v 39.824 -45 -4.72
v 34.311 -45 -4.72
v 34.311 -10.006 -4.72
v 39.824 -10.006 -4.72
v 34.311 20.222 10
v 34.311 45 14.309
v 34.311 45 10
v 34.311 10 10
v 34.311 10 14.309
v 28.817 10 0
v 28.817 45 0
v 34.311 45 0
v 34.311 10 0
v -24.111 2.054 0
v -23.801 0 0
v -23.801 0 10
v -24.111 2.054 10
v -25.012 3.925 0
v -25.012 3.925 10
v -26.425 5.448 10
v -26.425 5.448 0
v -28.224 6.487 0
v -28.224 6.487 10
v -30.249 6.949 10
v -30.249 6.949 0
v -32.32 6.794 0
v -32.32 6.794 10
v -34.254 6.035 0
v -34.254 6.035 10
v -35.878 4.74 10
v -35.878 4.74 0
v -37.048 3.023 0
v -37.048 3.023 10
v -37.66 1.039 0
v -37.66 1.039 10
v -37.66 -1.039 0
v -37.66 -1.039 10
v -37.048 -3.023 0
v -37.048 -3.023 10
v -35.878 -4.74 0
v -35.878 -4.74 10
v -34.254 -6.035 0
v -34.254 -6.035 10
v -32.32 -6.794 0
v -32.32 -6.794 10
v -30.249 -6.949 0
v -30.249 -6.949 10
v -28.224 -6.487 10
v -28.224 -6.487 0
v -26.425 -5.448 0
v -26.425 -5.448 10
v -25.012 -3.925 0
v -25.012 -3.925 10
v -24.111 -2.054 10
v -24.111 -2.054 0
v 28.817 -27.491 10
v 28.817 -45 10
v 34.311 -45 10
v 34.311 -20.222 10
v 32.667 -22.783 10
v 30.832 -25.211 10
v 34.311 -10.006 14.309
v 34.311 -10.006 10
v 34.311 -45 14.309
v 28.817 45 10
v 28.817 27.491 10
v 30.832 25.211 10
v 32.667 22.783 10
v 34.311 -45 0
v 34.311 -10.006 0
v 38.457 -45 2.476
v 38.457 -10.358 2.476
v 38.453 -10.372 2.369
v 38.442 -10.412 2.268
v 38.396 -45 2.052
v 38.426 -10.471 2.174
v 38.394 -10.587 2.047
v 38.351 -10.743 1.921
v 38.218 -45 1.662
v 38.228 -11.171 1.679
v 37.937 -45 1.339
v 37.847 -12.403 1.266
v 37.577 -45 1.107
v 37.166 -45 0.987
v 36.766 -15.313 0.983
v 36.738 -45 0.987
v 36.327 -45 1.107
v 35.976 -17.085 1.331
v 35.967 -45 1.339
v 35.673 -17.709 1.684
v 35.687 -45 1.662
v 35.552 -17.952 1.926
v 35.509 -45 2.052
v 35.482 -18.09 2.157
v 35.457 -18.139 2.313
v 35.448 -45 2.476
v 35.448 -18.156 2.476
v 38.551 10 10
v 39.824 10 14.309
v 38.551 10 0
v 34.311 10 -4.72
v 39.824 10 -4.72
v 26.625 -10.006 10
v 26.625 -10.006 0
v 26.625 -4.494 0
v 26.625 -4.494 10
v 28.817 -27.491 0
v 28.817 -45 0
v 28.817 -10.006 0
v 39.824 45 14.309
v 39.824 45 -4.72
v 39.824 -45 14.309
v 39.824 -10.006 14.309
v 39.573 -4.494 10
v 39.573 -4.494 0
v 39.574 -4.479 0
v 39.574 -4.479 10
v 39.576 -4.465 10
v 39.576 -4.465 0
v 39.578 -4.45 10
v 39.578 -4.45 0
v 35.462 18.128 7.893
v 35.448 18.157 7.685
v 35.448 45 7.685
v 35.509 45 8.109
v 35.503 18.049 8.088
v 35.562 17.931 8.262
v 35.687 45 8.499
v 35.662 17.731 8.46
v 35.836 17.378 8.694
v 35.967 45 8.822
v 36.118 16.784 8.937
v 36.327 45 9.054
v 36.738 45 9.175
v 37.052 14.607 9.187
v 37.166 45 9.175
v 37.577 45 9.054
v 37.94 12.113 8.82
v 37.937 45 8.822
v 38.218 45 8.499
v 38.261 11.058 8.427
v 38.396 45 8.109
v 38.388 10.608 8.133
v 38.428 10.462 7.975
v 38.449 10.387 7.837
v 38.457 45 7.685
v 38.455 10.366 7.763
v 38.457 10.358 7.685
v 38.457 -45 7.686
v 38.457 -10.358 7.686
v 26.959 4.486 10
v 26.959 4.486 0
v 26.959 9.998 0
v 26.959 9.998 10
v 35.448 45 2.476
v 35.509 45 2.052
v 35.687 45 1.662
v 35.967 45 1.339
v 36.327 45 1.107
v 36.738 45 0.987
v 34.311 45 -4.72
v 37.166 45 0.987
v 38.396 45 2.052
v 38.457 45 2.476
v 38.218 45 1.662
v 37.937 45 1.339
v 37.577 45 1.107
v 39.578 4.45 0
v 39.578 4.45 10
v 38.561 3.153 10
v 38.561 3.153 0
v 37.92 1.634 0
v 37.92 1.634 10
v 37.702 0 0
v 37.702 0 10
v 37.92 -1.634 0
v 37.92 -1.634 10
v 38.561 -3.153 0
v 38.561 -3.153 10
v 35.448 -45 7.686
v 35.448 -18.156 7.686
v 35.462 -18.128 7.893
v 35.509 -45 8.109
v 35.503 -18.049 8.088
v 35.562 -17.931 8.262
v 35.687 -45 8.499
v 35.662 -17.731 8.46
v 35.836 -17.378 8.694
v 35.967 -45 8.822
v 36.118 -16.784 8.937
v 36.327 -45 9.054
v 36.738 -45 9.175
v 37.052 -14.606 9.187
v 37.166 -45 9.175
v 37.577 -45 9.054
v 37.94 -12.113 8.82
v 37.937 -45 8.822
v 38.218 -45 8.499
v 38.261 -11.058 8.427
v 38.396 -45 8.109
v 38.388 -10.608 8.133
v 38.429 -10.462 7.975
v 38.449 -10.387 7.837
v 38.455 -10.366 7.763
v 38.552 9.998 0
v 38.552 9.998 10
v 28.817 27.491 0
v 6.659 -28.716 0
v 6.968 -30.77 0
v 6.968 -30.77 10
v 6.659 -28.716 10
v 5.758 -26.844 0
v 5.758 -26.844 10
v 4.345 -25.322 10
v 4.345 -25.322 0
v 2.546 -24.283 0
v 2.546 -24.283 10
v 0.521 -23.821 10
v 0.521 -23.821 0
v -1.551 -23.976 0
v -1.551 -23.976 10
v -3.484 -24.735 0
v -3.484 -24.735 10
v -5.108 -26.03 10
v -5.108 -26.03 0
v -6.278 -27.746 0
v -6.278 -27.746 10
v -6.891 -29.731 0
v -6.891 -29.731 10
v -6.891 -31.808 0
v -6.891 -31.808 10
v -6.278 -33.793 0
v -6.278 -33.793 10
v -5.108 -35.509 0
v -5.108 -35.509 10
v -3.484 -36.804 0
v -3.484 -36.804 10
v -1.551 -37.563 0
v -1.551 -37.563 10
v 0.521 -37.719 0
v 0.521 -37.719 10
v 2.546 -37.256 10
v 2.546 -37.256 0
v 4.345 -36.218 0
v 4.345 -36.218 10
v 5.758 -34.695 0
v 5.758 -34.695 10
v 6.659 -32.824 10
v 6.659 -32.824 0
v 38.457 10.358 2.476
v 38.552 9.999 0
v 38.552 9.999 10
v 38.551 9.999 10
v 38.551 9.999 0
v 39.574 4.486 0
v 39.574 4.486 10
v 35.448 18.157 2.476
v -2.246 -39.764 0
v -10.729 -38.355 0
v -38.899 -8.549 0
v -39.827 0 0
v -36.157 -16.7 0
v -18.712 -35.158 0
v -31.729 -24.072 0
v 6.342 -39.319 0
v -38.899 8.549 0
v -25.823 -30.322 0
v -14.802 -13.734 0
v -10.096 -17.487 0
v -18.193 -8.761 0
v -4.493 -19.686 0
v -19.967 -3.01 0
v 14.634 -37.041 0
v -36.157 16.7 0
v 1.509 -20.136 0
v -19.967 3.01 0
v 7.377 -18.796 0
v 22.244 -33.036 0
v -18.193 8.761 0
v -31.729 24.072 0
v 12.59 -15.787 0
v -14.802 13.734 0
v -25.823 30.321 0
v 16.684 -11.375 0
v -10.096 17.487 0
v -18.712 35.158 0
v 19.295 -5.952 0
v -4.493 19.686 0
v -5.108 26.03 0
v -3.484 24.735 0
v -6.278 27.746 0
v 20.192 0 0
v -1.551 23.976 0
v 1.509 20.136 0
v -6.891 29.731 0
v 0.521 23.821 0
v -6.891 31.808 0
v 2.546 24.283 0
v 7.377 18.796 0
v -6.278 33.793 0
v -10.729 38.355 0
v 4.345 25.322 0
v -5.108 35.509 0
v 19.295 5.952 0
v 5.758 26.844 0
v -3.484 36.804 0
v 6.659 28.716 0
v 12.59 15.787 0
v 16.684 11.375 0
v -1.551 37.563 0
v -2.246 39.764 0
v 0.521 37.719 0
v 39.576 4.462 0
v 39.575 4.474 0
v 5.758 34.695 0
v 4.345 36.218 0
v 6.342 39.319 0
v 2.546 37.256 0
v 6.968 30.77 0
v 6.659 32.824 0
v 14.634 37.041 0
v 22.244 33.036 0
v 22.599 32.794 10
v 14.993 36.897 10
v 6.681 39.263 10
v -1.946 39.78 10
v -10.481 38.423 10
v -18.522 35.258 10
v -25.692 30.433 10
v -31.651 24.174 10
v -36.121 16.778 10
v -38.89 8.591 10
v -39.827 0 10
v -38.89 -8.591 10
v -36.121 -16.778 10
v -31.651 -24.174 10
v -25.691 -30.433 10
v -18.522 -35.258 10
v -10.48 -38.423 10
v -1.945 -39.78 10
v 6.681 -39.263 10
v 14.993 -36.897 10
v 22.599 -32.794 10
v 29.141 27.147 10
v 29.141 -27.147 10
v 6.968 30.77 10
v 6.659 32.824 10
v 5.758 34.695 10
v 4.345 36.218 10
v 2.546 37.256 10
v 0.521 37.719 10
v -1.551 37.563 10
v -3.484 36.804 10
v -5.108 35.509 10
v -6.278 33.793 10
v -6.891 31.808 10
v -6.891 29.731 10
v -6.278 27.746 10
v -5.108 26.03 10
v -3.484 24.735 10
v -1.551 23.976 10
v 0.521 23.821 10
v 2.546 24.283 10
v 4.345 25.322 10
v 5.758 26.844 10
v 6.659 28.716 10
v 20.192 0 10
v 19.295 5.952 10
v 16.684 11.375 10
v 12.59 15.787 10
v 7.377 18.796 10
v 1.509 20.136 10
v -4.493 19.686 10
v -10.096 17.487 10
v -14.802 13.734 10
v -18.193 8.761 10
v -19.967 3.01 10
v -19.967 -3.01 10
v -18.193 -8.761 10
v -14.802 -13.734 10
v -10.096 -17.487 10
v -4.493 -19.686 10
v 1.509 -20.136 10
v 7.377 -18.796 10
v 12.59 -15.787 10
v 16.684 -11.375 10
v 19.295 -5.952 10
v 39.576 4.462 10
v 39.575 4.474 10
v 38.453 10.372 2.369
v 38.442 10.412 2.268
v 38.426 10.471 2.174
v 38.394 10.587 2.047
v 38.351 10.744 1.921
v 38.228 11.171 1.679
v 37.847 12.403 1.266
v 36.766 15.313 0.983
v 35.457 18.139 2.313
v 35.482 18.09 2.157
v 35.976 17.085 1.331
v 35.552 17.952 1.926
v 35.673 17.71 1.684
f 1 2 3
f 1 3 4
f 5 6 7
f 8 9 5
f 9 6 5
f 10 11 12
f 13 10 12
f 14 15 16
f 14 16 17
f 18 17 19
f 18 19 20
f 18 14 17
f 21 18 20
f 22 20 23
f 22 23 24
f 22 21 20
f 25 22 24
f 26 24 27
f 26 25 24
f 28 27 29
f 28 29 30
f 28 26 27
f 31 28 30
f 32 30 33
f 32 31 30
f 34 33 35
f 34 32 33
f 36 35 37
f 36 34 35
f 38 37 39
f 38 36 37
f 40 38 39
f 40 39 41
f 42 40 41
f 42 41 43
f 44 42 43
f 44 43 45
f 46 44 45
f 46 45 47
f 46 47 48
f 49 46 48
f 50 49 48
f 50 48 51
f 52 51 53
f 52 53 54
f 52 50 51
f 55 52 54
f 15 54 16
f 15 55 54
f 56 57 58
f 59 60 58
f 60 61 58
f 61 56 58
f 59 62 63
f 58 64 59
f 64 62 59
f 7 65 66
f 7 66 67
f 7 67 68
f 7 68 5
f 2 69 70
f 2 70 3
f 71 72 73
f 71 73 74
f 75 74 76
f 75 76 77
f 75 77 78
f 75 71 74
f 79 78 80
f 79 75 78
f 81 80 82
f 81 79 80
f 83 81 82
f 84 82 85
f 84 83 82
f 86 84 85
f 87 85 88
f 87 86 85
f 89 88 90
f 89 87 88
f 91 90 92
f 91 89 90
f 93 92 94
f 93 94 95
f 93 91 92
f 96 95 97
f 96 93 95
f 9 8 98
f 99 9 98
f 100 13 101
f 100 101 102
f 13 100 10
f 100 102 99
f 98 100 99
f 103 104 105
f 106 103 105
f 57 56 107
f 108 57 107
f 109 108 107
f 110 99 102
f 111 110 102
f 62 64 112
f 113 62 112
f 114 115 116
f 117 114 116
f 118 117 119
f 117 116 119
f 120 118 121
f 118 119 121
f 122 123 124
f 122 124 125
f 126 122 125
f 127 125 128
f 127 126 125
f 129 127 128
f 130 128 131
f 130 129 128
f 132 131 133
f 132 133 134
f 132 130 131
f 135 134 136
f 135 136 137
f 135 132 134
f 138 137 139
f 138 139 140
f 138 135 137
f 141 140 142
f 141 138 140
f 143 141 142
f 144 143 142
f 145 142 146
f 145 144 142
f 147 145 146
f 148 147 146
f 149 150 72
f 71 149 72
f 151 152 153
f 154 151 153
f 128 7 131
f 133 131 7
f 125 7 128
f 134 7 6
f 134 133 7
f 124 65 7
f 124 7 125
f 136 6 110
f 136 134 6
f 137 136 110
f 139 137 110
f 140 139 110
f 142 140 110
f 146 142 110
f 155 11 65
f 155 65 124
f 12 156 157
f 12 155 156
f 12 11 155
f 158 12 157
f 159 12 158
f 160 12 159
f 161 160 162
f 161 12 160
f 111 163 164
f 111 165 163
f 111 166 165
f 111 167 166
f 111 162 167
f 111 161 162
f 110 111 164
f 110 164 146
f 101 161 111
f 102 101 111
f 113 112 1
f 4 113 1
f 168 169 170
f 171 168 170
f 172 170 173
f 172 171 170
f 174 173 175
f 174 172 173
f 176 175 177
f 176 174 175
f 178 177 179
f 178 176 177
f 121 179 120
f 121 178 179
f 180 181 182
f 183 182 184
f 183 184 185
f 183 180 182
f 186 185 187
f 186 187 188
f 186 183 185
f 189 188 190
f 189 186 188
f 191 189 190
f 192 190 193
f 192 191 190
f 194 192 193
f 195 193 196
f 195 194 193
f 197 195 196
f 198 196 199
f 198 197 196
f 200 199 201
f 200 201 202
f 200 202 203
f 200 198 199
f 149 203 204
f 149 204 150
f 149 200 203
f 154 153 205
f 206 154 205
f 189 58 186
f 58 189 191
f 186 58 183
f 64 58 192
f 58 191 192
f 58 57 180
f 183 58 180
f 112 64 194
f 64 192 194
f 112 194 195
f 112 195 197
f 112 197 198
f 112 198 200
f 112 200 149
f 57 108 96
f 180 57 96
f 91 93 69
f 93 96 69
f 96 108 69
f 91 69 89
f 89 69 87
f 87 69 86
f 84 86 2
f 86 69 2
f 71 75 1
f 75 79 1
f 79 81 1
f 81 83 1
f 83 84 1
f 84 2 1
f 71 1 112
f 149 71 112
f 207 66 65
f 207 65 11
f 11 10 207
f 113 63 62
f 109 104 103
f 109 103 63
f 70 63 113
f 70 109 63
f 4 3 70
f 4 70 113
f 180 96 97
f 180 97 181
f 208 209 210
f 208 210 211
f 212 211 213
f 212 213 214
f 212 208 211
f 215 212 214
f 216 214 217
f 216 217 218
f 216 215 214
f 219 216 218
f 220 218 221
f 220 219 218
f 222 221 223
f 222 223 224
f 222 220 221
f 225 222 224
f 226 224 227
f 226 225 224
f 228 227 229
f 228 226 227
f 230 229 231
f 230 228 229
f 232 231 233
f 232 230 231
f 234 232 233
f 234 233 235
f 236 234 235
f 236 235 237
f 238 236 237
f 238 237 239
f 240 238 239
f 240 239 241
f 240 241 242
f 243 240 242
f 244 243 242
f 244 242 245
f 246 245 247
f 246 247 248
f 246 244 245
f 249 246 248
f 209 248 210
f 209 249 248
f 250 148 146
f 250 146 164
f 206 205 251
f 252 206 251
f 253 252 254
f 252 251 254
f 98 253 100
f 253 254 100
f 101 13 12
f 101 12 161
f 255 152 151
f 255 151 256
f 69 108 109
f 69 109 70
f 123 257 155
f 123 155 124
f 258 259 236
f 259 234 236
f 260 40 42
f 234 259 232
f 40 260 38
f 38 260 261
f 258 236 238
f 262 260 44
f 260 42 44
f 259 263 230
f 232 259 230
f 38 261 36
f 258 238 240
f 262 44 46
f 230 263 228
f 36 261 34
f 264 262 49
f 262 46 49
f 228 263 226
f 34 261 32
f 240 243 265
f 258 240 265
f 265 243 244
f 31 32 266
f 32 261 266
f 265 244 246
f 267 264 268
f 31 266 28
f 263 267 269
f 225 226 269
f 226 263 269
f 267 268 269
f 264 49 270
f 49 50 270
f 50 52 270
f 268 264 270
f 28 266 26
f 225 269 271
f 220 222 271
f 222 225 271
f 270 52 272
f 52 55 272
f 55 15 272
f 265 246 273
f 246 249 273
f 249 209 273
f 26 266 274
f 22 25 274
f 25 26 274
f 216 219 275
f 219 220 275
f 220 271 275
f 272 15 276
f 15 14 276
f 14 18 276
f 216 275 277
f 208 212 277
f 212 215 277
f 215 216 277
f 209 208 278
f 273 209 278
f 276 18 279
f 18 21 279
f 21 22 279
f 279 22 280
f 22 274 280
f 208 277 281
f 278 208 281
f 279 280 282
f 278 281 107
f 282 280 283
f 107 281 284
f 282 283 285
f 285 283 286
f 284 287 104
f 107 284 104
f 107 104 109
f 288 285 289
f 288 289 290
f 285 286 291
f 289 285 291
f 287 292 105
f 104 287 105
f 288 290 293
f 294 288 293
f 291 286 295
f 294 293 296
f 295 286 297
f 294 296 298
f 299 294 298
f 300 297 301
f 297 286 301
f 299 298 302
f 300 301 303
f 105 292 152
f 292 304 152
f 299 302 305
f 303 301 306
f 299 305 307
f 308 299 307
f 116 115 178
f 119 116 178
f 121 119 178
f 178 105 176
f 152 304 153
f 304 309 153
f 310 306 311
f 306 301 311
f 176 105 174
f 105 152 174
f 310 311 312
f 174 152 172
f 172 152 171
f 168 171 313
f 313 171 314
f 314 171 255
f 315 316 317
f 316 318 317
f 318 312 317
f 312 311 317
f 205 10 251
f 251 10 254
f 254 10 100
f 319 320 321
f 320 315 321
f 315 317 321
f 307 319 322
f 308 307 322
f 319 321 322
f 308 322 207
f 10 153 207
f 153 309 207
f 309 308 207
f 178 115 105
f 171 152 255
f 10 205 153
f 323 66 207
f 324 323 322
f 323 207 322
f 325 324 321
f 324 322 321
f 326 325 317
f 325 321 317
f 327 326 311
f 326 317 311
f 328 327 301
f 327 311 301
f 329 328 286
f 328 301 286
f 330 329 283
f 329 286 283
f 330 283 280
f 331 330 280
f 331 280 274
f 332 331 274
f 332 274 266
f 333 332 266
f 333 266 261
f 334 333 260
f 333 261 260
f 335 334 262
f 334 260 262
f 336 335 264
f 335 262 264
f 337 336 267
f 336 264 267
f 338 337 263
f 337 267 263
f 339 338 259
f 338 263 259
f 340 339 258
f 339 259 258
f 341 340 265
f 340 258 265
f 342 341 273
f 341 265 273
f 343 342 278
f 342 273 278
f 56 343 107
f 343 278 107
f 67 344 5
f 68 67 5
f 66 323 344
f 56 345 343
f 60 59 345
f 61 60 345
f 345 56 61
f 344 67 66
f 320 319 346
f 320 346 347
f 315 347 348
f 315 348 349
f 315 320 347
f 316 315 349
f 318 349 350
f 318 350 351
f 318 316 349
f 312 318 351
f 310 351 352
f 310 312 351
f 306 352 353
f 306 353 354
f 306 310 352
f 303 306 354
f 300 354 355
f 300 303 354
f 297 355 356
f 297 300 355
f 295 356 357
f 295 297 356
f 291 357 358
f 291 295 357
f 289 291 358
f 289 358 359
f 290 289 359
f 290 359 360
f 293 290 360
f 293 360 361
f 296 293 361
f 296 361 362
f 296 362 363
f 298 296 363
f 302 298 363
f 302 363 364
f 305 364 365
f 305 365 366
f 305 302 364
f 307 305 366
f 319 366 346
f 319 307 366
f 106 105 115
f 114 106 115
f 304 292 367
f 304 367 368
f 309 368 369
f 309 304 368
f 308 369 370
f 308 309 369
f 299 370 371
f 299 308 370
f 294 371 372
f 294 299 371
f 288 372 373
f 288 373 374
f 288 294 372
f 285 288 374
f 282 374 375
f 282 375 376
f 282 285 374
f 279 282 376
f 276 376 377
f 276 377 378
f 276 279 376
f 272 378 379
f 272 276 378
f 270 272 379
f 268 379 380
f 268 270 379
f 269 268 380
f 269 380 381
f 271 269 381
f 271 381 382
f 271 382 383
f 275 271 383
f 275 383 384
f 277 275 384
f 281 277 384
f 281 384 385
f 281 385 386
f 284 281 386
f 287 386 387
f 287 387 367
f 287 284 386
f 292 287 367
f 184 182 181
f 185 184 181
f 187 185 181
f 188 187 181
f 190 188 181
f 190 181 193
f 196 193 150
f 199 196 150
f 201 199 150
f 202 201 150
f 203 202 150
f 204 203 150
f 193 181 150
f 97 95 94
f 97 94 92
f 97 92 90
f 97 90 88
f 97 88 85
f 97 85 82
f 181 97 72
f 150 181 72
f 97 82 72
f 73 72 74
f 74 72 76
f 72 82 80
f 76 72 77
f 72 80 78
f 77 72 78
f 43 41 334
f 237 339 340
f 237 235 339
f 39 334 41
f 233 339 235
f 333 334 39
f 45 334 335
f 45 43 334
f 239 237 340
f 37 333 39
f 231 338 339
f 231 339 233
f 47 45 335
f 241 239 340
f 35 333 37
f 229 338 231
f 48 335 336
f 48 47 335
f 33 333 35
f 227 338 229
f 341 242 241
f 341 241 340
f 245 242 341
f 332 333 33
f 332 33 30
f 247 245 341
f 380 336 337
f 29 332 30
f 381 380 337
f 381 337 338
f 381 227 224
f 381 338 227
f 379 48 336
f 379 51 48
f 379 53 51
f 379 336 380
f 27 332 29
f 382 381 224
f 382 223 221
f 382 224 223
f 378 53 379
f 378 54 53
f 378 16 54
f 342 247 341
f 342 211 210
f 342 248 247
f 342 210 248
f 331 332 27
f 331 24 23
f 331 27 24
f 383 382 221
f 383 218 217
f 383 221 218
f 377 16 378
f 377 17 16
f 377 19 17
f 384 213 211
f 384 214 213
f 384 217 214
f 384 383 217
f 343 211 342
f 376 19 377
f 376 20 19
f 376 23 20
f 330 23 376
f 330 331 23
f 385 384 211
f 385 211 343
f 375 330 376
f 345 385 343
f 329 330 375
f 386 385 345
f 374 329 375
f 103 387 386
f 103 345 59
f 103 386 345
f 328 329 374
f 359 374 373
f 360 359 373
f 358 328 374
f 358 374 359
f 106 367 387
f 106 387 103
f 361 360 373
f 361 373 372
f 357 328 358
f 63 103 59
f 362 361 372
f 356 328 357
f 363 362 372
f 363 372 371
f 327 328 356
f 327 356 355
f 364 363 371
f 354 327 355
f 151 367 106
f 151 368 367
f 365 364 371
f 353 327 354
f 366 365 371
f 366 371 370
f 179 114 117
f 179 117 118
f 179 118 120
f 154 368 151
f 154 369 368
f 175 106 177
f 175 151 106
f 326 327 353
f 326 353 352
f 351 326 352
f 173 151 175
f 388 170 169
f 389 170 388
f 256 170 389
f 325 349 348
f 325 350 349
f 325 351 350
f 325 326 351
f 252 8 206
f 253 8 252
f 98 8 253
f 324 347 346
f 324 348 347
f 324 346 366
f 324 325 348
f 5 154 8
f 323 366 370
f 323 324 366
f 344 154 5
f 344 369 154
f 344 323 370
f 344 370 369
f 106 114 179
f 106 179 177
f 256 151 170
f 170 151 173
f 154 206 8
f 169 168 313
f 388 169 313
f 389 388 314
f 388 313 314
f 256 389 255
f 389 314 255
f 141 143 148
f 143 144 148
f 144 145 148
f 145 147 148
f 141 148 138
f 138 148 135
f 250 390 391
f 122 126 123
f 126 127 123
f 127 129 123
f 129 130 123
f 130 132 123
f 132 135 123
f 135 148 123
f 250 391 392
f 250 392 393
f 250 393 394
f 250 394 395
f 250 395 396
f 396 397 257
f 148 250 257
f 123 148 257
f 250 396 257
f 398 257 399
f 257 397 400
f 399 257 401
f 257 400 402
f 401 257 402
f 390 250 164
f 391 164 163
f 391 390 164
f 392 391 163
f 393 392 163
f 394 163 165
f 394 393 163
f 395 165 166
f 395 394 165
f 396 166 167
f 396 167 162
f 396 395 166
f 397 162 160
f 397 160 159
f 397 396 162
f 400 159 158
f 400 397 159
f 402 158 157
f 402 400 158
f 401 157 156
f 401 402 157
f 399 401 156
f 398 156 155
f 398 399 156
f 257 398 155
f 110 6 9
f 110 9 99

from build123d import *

# Parameters (mm, degrees)
SKETCH_1_R               = 39.827146721
SKETCH_1_R_2             = 20.192313572
SKETCH_1_R_3             = 6.968422522
EXTRUDE_1_DEPTH          = 10
EXTRUDE_4_DEPTH          = 25
EXTRUDE_4_DEPTH_BACK     = 10
SKETCH_9_W               = 5.512948522
SKETCH_9_H               = 19.029248926
SKETCH_9_W_2             = 5.494108899
SKETCH_9_H_2             = 10
EXTRUDE_5_DEPTH          = 10
EXTRUDE_5_DEPTH_BACK     = 25
SKETCH_10_W              = 5.512948523
SKETCH_10_H              = 19.029248926
SKETCH_10_W_2            = 5.494108899
SKETCH_10_H_2            = 10
CUT_EXTRUDE_3_DEPTH      = 30
CUT_EXTRUDE_3_DEPTH_BACK = 30
SKETCH_11_R              = 6.215767845
SKETCH_11_W              = 17.292355096
SKETCH_11_H              = 5.512218416


with BuildPart() as part:
    # 草图1 → 凸台-拉伸1 (new body)
    with BuildSketch(Plane.XY):
        Circle(SKETCH_1_R)
        Circle(SKETCH_1_R_2, mode=Mode.SUBTRACT)
        with Locations((0, 30.769644044)):
            Circle(SKETCH_1_R_3, mode=Mode.SUBTRACT)
        with Locations((0, -30.769644044)):
            Circle(SKETCH_1_R_3, mode=Mode.SUBTRACT)
        with Locations((-30.769644044, 0)):
            Circle(SKETCH_1_R_3, mode=Mode.SUBTRACT)
    extrude(amount=EXTRUDE_1_DEPTH)

    # 草图9 → 凸台-拉伸4 (add, two sides: drawn at the far end of the back side and taken through both)
    # profile 1 of 2: a face of its own
    with BuildSketch(Plane(origin=(0, 20, 0), x_dir=(1, 0, 0), z_dir=(0, 1, 0)).offset(-EXTRUDE_4_DEPTH_BACK)):
        with Locations((37.067708268, -4.794824214)):
            Rectangle(SKETCH_9_W, SKETCH_9_H)
        with BuildLine():
            ThreePointArc((35.447720425, -7.685496918), (36.952141211, -9.189917704), (38.456561997, -7.685496918))
            Line((38.456561997, -7.685496918), (38.456561997, -2.475743455))
            ThreePointArc((38.456561997, -2.475743455), (36.952141211, -0.971322669), (35.447720425, -2.475743455))
            Line((35.447720425, -2.475743455), (35.447720425, -7.685496918))
        make_face(mode=Mode.SUBTRACT)
    # profile 2 of 2: a face of its own
    with BuildSketch(Plane(origin=(0, 20, 0), x_dir=(1, 0, 0), z_dir=(0, 1, 0)).offset(-EXTRUDE_4_DEPTH_BACK)):
        with Locations((31.564179558, -4.999991318)):
            Rectangle(SKETCH_9_W_2, SKETCH_9_H_2)
    extrude(amount=EXTRUDE_4_DEPTH + EXTRUDE_4_DEPTH_BACK)

    # 草图10 → 凸台-拉伸5 (add, two sides: drawn at the far end of the back side and taken through both)
    # profile 1 of 2: a face of its own
    with BuildSketch(Plane(origin=(0, -20, 0), x_dir=(1, 0, 0), z_dir=(0, 1, 0)).offset(-EXTRUDE_5_DEPTH_BACK)):
        with Locations((37.067757535, -4.794829971)):
            Rectangle(SKETCH_10_W, SKETCH_10_H)
        with BuildLine():
            ThreePointArc((35.447769691, -7.685502675), (36.952190477, -9.189923461), (38.456611263, -7.685502675))
            Line((38.456611263, -7.685502675), (38.456611263, -2.475749212))
            ThreePointArc((38.456611263, -2.475749212), (36.952190477, -0.971328426), (35.447769691, -2.475749212))
            Line((35.447769691, -2.475749212), (35.447769691, -7.685502675))
        make_face(mode=Mode.SUBTRACT)
    # profile 2 of 2: a face of its own
    with BuildSketch(Plane(origin=(0, -20, 0), x_dir=(1, 0, 0), z_dir=(0, 1, 0)).offset(-EXTRUDE_5_DEPTH_BACK)):
        with Locations((31.564228824, -4.999997076)):
            Rectangle(SKETCH_10_W_2, SKETCH_10_H_2)
    extrude(amount=EXTRUDE_5_DEPTH + EXTRUDE_5_DEPTH_BACK)

    # 草图11 → 切除-拉伸3 (cut, two sides: drawn at the far end of the back side and taken through both)
    with BuildSketch(Plane.XY.offset(-CUT_EXTRUDE_3_DEPTH_BACK)):
        with BuildLine():
            ThreePointArc((39.615066117, 4.486072646), (37.701733016, -0.005715671), (39.62332367, -4.493977606))
            Line((39.62332367, -4.493977606), (43.917498233, -4.493977606))
            Line((43.917498233, -4.493977606), (43.917498233, -6.215767845))
            ThreePointArc((43.917498233, -6.215767845), (48.312709827, -4.395211593), (50.133266078, 0))
            ThreePointArc((50.133266078, 0), (48.429223467, 4.275523982), (44.251416636, 6.206792118))
            Line((44.251416636, 6.206792118), (44.251416636, 4.486072646))
            Line((44.251416636, 4.486072646), (39.615066117, 4.486072646))
        make_face()
        with Locations((43.917498233, 0)):
            Circle(SKETCH_11_R)
        with Locations((35.605239088, 7.242181854)):
            Rectangle(SKETCH_11_W, SKETCH_11_H)
        with Locations((35.271320685, -7.250086814)):
            Rectangle(SKETCH_11_W, SKETCH_11_H)
    extrude(amount=CUT_EXTRUDE_3_DEPTH + CUT_EXTRUDE_3_DEPTH_BACK, mode=Mode.SUBTRACT)


solid = part.part
